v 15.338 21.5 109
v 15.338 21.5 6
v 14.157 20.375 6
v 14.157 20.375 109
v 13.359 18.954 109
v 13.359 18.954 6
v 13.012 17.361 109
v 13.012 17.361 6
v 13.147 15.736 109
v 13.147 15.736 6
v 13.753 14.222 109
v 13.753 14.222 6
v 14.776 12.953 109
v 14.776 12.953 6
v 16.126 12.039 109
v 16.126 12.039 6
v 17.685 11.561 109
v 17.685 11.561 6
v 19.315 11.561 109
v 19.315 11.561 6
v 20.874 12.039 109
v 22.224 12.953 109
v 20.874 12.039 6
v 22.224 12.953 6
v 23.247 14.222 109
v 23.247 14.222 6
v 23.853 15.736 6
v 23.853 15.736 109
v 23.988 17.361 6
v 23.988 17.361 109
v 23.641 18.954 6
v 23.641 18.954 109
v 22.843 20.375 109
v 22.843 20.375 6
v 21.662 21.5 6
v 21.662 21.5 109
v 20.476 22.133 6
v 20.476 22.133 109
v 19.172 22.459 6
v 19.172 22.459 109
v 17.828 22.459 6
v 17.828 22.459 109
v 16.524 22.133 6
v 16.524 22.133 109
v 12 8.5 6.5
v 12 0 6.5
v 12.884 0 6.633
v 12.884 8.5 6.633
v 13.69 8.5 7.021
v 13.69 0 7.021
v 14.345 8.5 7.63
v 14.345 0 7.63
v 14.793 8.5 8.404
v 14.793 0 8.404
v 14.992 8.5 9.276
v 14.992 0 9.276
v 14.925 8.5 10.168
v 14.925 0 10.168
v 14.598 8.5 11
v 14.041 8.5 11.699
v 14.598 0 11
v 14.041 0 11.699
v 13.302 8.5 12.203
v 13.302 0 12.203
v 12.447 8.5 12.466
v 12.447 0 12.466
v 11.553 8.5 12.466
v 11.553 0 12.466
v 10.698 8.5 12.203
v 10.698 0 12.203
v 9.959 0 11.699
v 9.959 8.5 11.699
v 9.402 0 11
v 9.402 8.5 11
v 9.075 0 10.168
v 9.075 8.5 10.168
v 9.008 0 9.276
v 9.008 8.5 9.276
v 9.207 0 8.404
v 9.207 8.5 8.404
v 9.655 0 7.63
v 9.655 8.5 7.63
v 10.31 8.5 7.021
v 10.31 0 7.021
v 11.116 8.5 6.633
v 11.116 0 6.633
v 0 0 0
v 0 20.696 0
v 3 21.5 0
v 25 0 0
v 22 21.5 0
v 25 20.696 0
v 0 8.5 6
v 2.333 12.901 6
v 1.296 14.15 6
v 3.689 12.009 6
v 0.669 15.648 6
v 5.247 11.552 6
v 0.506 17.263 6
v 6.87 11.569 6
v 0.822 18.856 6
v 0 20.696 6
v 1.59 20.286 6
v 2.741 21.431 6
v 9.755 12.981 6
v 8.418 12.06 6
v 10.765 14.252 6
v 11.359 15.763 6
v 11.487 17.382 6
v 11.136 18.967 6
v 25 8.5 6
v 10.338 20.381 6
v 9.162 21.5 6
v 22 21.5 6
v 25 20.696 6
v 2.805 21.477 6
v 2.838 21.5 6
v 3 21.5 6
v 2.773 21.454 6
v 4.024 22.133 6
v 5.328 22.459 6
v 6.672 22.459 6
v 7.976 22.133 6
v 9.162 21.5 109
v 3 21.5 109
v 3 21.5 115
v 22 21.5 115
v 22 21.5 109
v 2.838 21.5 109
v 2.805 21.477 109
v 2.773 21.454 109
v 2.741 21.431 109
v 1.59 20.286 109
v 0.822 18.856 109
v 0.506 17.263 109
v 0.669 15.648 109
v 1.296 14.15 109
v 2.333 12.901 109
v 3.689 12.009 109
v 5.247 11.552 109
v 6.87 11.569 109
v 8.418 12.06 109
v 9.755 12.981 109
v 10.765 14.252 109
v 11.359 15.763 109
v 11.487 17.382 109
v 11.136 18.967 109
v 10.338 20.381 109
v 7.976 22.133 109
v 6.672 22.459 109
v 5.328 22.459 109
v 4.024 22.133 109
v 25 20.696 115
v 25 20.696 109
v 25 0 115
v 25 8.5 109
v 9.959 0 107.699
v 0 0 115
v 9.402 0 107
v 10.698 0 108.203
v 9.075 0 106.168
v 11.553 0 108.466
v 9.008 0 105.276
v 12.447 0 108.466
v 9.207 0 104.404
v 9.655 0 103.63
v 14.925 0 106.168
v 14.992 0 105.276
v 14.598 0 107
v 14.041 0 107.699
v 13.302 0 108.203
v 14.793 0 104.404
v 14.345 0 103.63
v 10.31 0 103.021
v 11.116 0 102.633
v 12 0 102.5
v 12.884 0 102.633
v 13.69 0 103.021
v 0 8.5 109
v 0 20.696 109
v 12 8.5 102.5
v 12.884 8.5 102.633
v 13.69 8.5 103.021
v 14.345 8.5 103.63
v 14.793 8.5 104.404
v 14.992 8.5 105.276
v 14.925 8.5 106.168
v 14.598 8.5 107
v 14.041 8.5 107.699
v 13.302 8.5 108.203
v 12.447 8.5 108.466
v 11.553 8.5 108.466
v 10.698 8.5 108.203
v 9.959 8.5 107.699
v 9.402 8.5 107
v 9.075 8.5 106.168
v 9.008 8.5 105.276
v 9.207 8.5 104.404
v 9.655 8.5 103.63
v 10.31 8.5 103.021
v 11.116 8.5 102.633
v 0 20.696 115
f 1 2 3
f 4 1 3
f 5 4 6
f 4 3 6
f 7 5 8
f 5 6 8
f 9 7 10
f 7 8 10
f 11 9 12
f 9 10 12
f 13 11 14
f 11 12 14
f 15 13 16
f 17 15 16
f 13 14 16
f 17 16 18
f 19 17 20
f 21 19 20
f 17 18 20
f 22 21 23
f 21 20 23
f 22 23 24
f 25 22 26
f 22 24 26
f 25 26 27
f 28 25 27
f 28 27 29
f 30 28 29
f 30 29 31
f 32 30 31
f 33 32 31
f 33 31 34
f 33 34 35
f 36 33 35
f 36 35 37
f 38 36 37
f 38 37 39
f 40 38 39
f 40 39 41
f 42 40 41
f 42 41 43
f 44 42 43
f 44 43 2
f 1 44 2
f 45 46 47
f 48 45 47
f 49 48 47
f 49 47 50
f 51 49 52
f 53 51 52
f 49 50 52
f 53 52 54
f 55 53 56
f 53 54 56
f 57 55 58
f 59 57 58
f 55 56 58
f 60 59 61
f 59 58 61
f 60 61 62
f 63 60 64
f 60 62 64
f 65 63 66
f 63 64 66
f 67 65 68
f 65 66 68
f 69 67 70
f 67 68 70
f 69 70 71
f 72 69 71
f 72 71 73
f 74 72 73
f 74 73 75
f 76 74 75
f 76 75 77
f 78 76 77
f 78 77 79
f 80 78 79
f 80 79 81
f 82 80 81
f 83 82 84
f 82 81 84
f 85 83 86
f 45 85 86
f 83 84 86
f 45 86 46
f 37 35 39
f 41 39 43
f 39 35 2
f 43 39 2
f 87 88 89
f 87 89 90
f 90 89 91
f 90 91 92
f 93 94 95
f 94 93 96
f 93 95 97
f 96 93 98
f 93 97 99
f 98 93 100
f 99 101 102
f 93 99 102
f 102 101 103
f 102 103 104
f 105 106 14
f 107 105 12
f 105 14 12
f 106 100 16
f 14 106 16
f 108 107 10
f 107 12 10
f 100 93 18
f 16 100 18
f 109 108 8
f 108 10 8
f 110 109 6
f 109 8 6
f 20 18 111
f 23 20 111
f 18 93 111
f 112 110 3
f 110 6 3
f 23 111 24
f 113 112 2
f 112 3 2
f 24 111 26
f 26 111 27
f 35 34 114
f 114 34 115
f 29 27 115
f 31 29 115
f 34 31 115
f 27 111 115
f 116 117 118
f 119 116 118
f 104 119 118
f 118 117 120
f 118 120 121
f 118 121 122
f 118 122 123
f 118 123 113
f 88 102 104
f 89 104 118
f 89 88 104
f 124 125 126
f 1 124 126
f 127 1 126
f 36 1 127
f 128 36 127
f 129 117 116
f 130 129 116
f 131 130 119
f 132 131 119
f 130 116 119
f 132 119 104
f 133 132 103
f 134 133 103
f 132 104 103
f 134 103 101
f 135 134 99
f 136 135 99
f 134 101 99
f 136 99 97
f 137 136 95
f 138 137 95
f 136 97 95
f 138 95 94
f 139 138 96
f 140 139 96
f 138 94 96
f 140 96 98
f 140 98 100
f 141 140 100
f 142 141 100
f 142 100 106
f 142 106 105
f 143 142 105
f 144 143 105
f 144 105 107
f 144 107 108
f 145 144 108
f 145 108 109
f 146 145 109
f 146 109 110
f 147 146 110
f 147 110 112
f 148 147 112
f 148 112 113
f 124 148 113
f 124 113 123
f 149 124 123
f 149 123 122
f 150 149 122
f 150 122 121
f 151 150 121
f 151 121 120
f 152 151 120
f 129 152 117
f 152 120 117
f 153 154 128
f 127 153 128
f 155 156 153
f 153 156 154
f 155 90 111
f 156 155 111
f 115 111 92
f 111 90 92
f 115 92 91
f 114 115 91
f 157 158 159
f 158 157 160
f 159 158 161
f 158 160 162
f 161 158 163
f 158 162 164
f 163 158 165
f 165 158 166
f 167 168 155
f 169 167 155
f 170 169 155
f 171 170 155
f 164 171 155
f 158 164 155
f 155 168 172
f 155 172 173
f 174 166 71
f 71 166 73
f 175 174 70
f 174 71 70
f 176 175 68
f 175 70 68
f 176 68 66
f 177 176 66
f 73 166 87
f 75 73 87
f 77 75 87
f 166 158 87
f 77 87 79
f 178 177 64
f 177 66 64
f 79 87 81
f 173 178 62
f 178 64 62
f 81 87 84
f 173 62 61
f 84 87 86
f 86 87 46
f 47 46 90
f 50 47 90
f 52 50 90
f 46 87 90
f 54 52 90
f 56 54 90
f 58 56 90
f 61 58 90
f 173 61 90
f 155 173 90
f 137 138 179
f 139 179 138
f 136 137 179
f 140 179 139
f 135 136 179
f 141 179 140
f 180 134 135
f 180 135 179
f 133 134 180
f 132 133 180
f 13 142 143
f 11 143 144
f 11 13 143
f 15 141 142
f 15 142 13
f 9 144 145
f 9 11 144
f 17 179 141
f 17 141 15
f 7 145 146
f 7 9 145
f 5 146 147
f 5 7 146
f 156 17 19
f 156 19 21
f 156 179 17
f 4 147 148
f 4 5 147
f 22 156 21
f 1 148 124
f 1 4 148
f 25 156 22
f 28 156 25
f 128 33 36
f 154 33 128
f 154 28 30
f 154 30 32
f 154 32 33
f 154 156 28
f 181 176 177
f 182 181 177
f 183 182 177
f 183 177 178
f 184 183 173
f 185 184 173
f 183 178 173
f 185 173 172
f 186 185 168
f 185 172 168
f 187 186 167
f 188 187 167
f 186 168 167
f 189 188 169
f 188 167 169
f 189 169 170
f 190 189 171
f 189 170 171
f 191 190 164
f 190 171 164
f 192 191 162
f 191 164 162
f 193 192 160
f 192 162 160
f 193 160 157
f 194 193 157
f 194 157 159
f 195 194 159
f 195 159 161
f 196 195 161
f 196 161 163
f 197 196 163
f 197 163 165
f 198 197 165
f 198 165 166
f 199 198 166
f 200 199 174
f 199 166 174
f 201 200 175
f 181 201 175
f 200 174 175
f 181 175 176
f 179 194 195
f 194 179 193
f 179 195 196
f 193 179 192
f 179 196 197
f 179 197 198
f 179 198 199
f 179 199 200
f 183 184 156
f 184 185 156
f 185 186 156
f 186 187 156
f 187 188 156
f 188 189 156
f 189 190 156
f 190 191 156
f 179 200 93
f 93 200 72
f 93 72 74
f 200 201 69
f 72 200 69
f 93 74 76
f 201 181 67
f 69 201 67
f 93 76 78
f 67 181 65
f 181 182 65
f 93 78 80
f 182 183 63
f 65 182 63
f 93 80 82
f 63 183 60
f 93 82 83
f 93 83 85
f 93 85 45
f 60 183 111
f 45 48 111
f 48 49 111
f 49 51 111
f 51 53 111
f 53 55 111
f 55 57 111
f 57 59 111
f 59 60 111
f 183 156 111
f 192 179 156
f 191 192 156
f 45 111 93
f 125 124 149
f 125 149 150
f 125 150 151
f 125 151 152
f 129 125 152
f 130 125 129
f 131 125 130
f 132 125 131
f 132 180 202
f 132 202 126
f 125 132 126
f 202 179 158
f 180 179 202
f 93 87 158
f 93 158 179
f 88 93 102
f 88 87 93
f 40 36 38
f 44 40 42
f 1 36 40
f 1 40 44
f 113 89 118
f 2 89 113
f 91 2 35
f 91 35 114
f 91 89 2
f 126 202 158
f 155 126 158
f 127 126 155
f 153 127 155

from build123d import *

# Parameters (mm, degrees)
SCHIZZO1_W               = 25
SCHIZZO1_H               = 21.5
ESTRUSIONE1_DEPTH        = 115
SCHIZZO6_W               = 103
SCHIZZO6_H               = 23.639461627
TAGLIO_ESTRUSIONE4_DEPTH = 84
SCHIZZO7_R               = 5.5
ESTRUSIONE4_DEPTH        = 103
SMUSSO1_SIZE             = 0.803847577
SMUSSO1_SIZE_2           = 3
SCHIZZO8_R               = 3
TAGLIO_ESTRUSIONE5_DEPTH = 8.5


with BuildPart() as part:
    # Schizzo1 → Estrusione1 (new body)
    with BuildSketch(Plane.XY):
        with Locations((12.5, 10.75)):
            Rectangle(SCHIZZO1_W, SCHIZZO1_H)
    extrude(amount=ESTRUSIONE1_DEPTH)

    # Schizzo6 → Taglio-Estrusione4 (cut)
    with BuildSketch(Plane(origin=(25, 0, 0), x_dir=(0, 0, -1), z_dir=(1, 0, 0))):
        with Locations((-57.5, 20.319730814)):
            Rectangle(SCHIZZO6_W, SCHIZZO6_H)
    extrude(amount=-TAGLIO_ESTRUSIONE4_DEPTH, mode=Mode.SUBTRACT)

    # Schizzo7 → Estrusione4 (add)
    with BuildSketch(Plane.XY.offset(6)):
        with Locations(Location((6, 17, 0), (0, 0, 125.096801228))):
            Circle(SCHIZZO7_R)
        with Locations(Location((18.5, 17, 0), (0, 0, 125.096801228))):
            Circle(SCHIZZO7_R)
    extrude(amount=ESTRUSIONE4_DEPTH)

    # Smusso1
    # the kernel refuses this chamfer: 3, 0.803847577 mm, written as the material it takes off along each edge
    with BuildSketch(Plane(origin=(0, 21.5, -7.790164711), x_dir=(-0.13751244702128895, -0.9905000388259545, 0), z_dir=(0, 0, 1)), Plane(origin=(0, 21.5, 109), x_dir=(-0.13751244702128895, -0.9905000388259545, 0), z_dir=(0, 0, 1))) as smusso1_piece_1:
        Polygon((SMUSSO1_SIZE * 0.990500039187, SMUSSO1_SIZE * 0.137512447071), (-SMUSSO1_SIZE_2 * 0.137512447021, SMUSSO1_SIZE_2 * 0.990500038826), (0, 0), align=None)
    extrude(amount=13.790164711, mode=Mode.SUBTRACT)
    with BuildSketch(Plane(origin=(25, 21.5, -7.790164711), x_dir=(0.13751244702128734, -0.9905000388259546, 0), z_dir=(0, 0, 1)), Plane(origin=(25, 21.5, 101.209835289), x_dir=(0.13751244702128734, -0.9905000388259546, 0), z_dir=(0, 0, 1))) as smusso1_piece_2:
        Polygon((SMUSSO1_SIZE * 0.990500039187, -SMUSSO1_SIZE * 0.137512447071), (-SMUSSO1_SIZE_2 * 0.137512447021, -SMUSSO1_SIZE_2 * 0.990500038826), (0, 0), align=None)
    extrude(amount=21.580329421, mode=Mode.SUBTRACT)

    # Schizzo8 → Taglio-Estrusione5 (cut)
    with BuildSketch(Plane.XZ):
        with Locations(Location((12, 105.5, 0), (0, 0, 270))):
            Circle(SCHIZZO8_R)
        with Locations(Location((12, 9.5, 0), (0, 0, 270))):
            Circle(SCHIZZO8_R)
    extrude(amount=-TAGLIO_ESTRUSIONE5_DEPTH, mode=Mode.SUBTRACT)


solid = part.part
